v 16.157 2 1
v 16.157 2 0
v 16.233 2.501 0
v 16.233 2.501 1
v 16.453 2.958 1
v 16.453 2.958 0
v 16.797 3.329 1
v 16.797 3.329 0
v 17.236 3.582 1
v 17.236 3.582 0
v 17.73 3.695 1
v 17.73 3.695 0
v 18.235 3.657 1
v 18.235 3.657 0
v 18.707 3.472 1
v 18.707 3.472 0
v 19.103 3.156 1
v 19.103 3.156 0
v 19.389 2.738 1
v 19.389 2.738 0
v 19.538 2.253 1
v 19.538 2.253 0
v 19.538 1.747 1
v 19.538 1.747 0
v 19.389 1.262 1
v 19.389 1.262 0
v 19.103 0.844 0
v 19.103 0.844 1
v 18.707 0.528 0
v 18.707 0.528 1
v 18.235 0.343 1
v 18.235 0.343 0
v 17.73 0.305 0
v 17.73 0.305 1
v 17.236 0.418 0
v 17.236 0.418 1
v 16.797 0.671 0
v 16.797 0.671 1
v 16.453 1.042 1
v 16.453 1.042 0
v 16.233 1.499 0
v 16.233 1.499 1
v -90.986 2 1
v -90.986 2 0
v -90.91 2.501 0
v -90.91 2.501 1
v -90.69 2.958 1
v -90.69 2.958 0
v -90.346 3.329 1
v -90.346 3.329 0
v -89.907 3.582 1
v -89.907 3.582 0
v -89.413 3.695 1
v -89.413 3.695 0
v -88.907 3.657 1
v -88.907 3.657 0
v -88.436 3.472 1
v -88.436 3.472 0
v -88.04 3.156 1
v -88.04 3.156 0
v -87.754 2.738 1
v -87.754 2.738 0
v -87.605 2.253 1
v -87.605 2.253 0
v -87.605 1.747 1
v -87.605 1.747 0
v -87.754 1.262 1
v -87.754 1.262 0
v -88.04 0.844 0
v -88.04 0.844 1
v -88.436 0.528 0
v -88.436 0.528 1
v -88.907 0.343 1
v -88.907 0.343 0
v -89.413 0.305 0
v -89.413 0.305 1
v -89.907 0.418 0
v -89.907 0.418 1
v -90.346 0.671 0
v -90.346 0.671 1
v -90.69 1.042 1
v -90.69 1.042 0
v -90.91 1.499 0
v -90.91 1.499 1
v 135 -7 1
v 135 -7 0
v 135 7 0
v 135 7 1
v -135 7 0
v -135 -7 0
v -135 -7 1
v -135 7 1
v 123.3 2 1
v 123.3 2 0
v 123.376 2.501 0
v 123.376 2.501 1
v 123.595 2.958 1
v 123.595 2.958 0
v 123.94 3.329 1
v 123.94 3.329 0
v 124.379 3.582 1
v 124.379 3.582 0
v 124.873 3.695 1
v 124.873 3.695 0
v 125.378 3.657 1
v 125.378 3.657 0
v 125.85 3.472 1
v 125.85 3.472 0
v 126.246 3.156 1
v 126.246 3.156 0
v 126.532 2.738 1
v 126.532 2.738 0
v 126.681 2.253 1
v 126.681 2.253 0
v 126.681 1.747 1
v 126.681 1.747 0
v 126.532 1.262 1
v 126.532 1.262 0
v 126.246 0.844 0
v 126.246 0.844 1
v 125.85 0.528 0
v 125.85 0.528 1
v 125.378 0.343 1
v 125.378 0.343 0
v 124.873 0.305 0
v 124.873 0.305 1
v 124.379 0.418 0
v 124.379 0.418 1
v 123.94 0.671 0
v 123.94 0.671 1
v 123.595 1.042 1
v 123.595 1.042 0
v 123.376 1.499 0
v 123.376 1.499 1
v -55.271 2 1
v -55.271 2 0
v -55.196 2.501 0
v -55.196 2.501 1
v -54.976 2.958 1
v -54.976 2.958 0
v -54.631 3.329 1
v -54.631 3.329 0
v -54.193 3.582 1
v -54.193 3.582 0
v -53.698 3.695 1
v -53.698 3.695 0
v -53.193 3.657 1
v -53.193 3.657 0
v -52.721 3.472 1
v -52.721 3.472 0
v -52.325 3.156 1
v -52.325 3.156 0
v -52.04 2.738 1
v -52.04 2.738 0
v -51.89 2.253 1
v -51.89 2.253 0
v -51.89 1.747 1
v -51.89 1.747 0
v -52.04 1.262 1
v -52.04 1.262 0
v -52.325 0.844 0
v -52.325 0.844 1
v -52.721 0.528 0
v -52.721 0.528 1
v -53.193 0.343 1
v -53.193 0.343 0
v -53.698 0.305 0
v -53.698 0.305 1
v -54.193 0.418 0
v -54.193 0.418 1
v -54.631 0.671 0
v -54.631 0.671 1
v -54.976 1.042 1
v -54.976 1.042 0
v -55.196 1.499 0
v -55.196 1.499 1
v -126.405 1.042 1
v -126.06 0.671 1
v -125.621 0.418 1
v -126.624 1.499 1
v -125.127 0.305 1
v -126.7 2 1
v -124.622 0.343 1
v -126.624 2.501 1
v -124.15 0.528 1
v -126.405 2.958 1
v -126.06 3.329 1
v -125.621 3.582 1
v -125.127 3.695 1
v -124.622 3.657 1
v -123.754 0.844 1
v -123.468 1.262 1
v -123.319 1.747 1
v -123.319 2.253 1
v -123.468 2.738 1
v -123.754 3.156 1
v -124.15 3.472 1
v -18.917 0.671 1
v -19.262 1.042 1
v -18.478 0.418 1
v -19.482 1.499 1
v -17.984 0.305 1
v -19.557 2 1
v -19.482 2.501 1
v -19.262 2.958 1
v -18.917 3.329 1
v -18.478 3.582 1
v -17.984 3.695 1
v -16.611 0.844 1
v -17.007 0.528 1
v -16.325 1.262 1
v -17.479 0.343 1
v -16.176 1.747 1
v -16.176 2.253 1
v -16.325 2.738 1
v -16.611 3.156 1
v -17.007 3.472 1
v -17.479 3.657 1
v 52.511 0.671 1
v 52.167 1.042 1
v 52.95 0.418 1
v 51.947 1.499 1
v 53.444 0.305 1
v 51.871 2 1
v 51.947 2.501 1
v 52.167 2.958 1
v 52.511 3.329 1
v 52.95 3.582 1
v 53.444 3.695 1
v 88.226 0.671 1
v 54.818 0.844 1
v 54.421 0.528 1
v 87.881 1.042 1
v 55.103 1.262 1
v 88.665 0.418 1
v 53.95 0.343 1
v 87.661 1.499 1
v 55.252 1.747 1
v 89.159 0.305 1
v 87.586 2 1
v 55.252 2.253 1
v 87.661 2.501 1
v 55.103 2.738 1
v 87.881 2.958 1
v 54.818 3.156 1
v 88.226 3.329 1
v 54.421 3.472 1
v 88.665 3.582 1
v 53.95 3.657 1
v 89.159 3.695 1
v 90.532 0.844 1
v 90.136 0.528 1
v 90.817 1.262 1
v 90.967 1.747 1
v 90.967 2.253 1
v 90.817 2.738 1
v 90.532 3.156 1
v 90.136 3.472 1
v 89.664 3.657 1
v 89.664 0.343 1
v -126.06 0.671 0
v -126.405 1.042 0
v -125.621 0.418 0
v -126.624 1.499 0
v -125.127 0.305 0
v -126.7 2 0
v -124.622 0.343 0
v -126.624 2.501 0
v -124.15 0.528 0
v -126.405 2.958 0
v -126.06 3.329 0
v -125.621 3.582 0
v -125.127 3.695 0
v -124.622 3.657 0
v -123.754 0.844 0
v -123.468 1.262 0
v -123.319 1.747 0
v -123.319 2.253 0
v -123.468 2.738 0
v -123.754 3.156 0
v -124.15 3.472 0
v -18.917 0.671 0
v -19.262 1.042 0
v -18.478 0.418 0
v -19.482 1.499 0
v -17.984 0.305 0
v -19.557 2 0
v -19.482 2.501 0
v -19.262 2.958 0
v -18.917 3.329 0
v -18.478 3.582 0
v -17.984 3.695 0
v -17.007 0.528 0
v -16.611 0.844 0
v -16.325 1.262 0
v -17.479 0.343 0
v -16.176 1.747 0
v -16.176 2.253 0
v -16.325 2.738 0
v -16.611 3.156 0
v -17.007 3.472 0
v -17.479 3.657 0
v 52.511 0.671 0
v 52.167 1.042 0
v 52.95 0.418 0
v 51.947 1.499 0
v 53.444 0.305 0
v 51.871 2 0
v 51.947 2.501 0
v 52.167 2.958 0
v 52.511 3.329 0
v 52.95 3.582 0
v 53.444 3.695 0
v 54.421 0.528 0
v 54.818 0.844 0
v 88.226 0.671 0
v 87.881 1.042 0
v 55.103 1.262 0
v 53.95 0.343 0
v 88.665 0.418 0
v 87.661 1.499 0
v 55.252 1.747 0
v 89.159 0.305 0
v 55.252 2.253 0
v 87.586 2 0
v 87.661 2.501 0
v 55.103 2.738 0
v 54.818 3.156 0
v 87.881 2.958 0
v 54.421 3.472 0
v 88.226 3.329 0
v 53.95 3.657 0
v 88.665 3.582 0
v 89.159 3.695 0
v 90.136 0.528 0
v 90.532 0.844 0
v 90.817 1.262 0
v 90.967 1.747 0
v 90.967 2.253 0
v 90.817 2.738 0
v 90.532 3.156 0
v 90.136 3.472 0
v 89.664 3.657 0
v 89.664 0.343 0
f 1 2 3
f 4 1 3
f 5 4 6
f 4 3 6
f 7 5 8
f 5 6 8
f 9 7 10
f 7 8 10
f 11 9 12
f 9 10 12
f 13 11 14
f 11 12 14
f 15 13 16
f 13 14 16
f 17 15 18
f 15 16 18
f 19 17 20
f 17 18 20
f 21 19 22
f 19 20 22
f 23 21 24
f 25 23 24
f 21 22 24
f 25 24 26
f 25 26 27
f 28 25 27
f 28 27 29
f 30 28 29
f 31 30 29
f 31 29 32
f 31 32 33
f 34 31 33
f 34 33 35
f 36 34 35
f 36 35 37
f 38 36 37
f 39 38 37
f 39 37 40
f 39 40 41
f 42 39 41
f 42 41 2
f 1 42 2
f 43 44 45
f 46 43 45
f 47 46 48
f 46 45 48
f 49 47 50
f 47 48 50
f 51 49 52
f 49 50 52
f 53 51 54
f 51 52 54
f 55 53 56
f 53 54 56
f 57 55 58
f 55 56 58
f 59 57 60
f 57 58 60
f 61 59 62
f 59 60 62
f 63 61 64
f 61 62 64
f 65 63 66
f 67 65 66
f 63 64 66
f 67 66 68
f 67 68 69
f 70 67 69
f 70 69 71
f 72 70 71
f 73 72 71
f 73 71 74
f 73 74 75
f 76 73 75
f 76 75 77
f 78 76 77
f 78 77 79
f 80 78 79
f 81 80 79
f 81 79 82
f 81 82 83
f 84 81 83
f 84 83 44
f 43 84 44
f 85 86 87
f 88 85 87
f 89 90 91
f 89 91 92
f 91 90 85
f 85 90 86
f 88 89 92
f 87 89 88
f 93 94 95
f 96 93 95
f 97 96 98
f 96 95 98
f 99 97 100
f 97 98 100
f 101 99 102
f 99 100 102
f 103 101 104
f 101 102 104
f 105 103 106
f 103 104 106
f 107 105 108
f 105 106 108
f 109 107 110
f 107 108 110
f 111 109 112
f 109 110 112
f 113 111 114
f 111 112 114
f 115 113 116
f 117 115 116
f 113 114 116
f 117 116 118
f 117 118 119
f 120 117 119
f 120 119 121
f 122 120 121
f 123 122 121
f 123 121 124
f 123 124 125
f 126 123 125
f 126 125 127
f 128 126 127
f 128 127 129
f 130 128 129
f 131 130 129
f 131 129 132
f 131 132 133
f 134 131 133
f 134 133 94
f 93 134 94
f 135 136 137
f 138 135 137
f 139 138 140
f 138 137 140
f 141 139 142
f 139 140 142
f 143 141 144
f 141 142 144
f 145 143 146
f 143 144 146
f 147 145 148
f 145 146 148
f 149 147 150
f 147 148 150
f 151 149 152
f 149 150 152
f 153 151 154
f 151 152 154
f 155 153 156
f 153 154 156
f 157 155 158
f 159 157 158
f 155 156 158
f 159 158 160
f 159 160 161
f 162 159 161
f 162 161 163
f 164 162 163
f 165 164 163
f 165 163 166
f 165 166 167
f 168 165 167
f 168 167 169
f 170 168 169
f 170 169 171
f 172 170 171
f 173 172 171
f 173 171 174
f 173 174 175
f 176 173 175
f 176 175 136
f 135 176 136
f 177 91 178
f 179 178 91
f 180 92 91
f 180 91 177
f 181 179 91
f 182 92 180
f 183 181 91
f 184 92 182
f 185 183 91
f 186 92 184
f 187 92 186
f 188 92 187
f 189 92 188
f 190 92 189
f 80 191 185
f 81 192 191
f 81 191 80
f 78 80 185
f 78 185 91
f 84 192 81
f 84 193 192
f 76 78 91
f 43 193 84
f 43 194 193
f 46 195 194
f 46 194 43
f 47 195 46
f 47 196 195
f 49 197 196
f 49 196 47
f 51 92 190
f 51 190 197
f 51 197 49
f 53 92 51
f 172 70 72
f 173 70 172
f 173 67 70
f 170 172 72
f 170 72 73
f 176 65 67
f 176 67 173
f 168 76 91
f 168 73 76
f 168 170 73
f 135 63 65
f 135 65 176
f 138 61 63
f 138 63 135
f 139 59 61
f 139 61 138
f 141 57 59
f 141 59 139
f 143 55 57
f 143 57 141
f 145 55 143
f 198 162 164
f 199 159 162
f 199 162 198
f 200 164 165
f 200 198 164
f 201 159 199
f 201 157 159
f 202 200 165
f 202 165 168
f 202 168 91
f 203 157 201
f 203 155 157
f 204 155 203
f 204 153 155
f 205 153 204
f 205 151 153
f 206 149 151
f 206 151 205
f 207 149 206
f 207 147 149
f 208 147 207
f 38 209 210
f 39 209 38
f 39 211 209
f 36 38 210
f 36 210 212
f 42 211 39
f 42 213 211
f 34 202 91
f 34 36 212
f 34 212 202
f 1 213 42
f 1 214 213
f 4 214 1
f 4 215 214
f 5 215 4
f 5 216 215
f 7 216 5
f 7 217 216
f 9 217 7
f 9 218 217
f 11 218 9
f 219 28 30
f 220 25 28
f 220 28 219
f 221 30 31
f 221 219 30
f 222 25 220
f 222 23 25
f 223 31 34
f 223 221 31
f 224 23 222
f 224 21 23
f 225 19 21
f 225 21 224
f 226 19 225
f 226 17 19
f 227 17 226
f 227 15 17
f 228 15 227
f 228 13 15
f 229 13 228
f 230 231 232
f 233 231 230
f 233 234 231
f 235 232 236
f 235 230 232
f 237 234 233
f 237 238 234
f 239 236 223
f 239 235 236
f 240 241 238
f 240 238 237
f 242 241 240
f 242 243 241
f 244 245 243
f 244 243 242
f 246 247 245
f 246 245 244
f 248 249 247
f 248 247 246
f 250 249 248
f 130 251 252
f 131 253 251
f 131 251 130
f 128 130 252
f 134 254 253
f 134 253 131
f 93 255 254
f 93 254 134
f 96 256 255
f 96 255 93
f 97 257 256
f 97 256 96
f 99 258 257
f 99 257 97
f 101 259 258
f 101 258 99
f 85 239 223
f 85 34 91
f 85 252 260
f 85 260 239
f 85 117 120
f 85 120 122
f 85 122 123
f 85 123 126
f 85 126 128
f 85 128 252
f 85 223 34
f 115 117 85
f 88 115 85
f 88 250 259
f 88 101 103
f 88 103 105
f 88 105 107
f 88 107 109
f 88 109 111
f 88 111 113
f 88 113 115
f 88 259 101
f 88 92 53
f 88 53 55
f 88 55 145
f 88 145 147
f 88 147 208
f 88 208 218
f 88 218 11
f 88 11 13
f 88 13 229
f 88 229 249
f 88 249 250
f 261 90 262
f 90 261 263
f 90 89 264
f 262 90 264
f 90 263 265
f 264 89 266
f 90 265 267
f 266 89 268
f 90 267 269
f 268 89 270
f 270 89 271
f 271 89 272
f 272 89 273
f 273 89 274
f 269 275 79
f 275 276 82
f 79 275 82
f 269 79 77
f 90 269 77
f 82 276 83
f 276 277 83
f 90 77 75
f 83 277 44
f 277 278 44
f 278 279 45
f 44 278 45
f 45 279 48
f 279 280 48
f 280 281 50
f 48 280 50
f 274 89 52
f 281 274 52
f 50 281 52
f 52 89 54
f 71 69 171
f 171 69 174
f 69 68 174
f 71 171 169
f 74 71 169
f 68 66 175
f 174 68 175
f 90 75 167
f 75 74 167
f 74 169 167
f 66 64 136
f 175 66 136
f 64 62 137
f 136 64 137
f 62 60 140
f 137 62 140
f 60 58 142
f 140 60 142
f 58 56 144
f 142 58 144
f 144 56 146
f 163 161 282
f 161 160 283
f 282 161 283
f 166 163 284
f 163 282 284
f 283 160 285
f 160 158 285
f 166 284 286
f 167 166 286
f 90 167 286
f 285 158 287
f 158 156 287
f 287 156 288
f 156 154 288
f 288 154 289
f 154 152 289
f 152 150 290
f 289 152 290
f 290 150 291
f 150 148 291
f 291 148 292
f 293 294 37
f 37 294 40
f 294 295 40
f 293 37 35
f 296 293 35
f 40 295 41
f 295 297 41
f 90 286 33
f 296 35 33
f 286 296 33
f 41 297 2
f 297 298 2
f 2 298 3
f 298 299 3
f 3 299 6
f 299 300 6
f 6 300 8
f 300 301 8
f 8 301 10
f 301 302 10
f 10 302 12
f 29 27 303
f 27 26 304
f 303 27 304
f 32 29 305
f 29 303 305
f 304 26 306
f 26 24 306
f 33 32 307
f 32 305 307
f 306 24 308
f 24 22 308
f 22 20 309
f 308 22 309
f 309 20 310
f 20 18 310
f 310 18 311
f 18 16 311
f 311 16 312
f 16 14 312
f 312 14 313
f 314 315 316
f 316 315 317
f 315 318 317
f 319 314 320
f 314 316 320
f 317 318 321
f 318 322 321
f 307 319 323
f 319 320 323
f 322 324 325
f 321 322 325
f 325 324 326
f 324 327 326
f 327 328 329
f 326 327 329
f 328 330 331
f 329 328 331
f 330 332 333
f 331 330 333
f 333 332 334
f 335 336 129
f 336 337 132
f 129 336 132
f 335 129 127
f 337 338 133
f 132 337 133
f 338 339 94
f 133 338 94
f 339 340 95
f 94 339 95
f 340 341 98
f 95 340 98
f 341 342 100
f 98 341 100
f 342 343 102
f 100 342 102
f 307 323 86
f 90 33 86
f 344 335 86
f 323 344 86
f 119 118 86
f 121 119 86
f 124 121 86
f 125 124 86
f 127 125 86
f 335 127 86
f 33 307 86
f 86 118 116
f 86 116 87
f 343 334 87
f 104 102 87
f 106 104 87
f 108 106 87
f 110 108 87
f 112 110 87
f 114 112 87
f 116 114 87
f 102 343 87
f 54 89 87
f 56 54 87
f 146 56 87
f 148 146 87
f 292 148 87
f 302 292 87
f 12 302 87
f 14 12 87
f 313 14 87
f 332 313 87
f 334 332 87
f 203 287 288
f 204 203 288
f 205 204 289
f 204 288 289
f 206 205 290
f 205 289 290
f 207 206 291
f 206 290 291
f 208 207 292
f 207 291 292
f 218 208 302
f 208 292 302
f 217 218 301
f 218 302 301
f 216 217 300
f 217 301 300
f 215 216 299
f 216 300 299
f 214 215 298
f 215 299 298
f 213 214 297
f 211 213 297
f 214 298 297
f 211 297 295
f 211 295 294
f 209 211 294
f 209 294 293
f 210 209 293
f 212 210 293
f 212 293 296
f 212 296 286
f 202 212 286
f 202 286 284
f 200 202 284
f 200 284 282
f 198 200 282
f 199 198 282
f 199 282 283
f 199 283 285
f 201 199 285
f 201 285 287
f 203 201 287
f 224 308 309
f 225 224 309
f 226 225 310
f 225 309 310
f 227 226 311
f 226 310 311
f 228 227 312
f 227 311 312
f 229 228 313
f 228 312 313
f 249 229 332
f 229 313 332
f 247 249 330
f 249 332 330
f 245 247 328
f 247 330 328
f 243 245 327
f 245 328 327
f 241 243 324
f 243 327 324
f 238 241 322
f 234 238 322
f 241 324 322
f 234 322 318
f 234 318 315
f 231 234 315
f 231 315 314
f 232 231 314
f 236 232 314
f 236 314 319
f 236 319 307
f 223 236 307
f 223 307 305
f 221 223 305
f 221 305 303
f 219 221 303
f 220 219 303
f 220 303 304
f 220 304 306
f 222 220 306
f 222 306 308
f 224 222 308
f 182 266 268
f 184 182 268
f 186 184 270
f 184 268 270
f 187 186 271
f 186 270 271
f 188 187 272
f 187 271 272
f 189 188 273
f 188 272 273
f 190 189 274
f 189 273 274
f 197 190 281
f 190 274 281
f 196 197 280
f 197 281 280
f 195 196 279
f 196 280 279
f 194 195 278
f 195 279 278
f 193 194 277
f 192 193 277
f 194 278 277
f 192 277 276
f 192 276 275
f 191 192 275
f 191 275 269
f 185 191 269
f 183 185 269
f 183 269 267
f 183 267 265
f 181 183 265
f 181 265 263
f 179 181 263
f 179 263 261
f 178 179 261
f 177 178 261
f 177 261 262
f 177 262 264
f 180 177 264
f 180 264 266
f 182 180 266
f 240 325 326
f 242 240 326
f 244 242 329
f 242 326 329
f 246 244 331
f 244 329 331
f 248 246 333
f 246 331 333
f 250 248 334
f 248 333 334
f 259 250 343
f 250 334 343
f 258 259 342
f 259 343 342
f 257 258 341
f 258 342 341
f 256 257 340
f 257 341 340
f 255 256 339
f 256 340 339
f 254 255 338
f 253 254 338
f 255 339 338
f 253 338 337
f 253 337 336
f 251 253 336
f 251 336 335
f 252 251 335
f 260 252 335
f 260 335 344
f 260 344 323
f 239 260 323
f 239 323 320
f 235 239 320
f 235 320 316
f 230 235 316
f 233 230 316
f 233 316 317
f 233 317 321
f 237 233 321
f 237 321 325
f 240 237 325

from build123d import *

# Parameters (mm, degrees)
SKETCH1_W            = 270
SKETCH1_H            = 14
BOSS_EXTRUDE1_DEPTH  = 1
M3_CLEARANCE_HOLE1_D = 3.4
LPATTERN1_COUNT      = 8
LPATTERN1_PITCH      = 35.714285714


with BuildPart() as part:
    # Sketch1 → Boss-Extrude1 (new body)
    with BuildSketch(Plane.XY):
        Rectangle(SKETCH1_W, SKETCH1_H)
    extrude(amount=BOSS_EXTRUDE1_DEPTH)

    # M3 Clearance Hole1 (through all)
    with Locations(Plane.XY.offset(1)):
        with Locations((125, 2)):
            m3_clearance_hole1 = Hole(M3_CLEARANCE_HOLE1_D / 2)

    # LPattern1: M3 Clearance Hole1 ×8
    with Locations(*[(-i * LPATTERN1_PITCH, 0, 0) for i in range(1, LPATTERN1_COUNT)]):
        add(m3_clearance_hole1, mode=Mode.SUBTRACT)


solid = part.part
